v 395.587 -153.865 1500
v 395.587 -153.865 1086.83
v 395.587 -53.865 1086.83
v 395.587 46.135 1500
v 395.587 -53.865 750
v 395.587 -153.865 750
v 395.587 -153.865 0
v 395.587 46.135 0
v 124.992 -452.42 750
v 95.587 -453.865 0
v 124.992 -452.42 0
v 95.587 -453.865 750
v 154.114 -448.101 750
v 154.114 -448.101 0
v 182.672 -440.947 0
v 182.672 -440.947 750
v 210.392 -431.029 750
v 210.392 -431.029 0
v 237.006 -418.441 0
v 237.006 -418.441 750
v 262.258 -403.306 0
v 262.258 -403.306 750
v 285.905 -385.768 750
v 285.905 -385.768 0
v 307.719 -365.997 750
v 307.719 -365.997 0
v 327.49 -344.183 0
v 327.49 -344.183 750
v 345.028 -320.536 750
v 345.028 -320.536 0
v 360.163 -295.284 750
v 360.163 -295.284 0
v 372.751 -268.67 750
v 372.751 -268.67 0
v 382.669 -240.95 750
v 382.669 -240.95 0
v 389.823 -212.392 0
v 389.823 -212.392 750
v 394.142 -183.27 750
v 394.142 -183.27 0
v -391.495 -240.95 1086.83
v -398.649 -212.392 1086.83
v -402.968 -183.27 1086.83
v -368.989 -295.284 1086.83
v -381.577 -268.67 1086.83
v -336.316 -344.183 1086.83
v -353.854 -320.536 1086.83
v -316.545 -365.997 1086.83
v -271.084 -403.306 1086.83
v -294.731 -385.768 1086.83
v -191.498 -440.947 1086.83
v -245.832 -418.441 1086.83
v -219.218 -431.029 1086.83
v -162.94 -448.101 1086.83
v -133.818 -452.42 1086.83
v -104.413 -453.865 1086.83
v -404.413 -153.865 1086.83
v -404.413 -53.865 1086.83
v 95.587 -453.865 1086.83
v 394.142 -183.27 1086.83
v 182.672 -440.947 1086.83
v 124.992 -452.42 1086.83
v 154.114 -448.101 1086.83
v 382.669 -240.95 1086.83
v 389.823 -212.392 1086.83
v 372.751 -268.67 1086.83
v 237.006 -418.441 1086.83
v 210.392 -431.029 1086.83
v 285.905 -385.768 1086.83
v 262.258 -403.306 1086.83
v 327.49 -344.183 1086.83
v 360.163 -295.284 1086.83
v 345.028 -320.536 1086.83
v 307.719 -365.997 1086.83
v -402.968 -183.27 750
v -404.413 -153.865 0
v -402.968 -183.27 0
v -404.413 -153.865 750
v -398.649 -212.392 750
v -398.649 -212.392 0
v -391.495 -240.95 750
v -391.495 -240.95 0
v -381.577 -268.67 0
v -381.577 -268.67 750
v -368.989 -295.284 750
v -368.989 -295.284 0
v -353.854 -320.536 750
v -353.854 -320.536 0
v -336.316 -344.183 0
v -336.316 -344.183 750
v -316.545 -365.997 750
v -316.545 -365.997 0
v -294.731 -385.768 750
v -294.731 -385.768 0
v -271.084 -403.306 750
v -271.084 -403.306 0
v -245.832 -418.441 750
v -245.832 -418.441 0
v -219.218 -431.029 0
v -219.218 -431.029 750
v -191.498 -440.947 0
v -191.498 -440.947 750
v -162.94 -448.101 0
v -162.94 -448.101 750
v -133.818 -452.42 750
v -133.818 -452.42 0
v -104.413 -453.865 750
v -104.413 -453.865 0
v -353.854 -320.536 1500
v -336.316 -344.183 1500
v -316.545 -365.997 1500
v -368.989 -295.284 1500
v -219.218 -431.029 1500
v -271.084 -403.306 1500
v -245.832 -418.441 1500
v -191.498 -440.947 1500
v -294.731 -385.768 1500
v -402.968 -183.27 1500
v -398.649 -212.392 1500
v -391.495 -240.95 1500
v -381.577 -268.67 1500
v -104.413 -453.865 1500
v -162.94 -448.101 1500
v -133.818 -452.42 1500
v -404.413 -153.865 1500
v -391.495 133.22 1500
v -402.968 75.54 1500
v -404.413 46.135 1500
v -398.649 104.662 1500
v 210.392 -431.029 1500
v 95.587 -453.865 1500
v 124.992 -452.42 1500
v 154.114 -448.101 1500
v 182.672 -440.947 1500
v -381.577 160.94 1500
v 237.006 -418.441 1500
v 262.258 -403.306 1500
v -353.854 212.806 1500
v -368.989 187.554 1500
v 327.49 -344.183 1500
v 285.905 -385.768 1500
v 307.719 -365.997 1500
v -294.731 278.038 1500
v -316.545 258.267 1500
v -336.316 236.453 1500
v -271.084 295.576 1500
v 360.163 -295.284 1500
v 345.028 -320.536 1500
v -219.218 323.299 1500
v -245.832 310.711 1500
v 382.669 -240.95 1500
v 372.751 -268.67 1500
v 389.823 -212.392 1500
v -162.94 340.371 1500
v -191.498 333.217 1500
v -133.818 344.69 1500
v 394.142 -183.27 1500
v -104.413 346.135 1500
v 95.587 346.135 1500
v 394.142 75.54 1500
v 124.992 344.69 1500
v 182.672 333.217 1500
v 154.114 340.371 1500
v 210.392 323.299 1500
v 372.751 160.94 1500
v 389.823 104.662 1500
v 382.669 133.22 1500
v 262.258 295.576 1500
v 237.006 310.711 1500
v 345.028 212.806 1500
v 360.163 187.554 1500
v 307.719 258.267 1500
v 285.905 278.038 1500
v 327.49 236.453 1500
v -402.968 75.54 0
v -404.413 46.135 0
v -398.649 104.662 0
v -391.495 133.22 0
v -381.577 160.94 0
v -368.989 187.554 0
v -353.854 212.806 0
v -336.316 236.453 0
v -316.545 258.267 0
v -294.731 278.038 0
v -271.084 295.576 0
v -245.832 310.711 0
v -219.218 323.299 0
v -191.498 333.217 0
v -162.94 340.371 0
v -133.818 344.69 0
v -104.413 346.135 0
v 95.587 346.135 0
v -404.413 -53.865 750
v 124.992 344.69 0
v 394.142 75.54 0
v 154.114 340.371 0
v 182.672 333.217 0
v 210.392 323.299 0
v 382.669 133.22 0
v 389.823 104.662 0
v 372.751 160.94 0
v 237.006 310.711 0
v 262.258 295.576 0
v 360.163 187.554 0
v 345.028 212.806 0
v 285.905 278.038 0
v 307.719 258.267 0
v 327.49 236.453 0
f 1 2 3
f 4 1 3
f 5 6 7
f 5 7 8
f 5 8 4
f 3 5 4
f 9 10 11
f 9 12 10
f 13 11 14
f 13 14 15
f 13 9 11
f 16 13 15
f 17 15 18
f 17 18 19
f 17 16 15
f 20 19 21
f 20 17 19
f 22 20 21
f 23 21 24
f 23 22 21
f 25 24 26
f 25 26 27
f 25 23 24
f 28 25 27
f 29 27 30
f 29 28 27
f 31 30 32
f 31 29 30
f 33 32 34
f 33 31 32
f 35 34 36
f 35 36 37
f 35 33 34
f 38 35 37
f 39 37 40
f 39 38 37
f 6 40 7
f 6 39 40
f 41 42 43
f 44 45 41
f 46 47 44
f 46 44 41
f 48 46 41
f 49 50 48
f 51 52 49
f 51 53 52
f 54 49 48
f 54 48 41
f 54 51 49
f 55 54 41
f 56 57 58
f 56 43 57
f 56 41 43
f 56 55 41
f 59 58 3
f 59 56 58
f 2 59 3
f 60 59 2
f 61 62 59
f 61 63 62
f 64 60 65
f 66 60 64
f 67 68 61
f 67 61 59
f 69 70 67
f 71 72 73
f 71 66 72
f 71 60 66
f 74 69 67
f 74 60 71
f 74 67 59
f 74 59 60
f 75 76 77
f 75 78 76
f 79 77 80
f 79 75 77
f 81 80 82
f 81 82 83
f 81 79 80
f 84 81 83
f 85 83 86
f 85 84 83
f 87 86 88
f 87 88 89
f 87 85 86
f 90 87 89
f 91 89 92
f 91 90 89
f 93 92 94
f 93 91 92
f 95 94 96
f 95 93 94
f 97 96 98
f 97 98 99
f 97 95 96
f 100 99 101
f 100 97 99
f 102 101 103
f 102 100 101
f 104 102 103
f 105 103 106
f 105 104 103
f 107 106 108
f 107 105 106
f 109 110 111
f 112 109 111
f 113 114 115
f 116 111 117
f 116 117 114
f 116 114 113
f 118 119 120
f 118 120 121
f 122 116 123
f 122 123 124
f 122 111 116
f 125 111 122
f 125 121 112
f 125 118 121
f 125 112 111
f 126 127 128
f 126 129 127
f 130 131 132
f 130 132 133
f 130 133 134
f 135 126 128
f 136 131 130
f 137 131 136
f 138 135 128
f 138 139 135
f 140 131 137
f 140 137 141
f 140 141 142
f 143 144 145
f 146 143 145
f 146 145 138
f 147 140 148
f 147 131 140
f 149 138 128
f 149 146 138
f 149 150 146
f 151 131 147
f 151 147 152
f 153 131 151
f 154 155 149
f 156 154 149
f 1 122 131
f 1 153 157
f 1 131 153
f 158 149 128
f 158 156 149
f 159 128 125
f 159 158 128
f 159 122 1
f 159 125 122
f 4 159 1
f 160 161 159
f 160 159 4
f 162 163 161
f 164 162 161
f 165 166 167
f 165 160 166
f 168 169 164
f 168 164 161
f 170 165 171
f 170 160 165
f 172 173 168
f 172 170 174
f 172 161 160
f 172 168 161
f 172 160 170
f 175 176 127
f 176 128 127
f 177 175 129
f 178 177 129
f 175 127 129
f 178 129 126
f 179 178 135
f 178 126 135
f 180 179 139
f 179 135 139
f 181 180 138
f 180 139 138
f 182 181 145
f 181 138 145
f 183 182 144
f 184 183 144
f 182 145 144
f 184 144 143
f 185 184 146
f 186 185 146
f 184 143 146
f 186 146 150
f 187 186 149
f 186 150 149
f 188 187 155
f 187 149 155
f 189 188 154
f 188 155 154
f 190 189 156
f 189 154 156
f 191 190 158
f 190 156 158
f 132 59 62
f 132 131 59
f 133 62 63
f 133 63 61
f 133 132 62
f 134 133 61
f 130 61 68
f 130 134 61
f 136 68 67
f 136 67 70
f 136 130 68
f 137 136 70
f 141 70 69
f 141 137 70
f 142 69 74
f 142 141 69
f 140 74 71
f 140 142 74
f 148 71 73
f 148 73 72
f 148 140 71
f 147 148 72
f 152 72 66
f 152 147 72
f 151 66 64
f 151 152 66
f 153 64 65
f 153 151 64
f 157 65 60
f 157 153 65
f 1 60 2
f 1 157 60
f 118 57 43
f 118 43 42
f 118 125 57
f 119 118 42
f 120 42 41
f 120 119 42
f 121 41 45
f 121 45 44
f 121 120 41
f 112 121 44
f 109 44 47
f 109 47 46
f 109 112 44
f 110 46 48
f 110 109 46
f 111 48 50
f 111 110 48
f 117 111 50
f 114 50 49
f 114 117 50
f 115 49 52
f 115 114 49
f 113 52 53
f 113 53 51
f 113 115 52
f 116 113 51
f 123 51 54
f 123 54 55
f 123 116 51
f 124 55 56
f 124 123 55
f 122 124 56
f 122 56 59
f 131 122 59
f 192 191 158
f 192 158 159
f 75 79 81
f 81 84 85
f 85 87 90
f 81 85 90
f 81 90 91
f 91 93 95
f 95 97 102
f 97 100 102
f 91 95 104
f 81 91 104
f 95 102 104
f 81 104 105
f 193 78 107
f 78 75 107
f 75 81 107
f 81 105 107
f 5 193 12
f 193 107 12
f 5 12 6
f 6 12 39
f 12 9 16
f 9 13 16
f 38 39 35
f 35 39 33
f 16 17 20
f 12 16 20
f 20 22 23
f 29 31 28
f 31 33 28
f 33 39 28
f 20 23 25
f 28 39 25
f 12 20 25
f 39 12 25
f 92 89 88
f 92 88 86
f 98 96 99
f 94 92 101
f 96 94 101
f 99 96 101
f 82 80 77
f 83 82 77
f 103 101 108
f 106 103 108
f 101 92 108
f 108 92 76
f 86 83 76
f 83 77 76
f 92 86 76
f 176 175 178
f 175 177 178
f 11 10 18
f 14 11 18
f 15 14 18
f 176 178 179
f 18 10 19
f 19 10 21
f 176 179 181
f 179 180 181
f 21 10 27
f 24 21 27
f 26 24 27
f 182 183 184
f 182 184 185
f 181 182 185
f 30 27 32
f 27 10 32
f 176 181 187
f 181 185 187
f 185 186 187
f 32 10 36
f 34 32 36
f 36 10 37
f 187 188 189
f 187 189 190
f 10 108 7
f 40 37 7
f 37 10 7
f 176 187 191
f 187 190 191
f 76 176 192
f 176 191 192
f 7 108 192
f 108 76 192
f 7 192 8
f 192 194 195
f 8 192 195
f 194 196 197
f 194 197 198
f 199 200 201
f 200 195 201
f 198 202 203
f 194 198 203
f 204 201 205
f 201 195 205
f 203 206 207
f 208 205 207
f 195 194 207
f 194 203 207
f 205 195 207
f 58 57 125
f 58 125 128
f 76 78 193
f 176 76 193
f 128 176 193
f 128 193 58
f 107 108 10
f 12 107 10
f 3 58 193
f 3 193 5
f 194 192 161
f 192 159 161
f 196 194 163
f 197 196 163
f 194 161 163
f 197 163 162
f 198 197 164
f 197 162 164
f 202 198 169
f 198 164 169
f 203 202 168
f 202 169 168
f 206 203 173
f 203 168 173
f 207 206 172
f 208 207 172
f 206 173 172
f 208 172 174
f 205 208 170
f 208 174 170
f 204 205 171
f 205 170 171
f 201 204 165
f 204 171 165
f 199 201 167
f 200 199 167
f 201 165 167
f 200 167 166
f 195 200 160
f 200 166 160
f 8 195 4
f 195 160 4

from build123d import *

# Parameters (mm, degrees)
F0_W     = 800
F0_H     = 800
F1_DEPTH = 1500
F2_W     = 800
F2_H     = 336.829662323
F3_DEPTH = 400
F4_R     = 300


with BuildPart() as f1:
    # F0 (on Top) → F1 (new body)
    with BuildSketch(Plane.XY):
        with Locations((-4.4129546732, -53.8649755846)):
            Rectangle(F0_W, F0_H)
    extrude(amount=F1_DEPTH)

    # F2 (on face) → F3 (cut)
    with BuildSketch(Plane.XZ.offset(453.8649755846)):
        with Locations((-4.4129546732, 918.4148311615)):
            Rectangle(F2_W, F2_H)
    extrude(amount=-F3_DEPTH, mode=Mode.SUBTRACT)

    # F4
    f4_edges = [f1.edges().sort_by_distance(p)[0] for p in [
        (-404.412955, 346.135024, 750),
        (395.587045, 346.135024, 750),
        (-404.412955, -453.864976, 1293.414831),
        (-404.412955, -453.864976, 375),
        (395.587045, -453.864976, 1293.414831),
        (395.587045, -453.864976, 375),
    ]]
    fillet(f4_edges, radius=F4_R)


solid = f1.part
